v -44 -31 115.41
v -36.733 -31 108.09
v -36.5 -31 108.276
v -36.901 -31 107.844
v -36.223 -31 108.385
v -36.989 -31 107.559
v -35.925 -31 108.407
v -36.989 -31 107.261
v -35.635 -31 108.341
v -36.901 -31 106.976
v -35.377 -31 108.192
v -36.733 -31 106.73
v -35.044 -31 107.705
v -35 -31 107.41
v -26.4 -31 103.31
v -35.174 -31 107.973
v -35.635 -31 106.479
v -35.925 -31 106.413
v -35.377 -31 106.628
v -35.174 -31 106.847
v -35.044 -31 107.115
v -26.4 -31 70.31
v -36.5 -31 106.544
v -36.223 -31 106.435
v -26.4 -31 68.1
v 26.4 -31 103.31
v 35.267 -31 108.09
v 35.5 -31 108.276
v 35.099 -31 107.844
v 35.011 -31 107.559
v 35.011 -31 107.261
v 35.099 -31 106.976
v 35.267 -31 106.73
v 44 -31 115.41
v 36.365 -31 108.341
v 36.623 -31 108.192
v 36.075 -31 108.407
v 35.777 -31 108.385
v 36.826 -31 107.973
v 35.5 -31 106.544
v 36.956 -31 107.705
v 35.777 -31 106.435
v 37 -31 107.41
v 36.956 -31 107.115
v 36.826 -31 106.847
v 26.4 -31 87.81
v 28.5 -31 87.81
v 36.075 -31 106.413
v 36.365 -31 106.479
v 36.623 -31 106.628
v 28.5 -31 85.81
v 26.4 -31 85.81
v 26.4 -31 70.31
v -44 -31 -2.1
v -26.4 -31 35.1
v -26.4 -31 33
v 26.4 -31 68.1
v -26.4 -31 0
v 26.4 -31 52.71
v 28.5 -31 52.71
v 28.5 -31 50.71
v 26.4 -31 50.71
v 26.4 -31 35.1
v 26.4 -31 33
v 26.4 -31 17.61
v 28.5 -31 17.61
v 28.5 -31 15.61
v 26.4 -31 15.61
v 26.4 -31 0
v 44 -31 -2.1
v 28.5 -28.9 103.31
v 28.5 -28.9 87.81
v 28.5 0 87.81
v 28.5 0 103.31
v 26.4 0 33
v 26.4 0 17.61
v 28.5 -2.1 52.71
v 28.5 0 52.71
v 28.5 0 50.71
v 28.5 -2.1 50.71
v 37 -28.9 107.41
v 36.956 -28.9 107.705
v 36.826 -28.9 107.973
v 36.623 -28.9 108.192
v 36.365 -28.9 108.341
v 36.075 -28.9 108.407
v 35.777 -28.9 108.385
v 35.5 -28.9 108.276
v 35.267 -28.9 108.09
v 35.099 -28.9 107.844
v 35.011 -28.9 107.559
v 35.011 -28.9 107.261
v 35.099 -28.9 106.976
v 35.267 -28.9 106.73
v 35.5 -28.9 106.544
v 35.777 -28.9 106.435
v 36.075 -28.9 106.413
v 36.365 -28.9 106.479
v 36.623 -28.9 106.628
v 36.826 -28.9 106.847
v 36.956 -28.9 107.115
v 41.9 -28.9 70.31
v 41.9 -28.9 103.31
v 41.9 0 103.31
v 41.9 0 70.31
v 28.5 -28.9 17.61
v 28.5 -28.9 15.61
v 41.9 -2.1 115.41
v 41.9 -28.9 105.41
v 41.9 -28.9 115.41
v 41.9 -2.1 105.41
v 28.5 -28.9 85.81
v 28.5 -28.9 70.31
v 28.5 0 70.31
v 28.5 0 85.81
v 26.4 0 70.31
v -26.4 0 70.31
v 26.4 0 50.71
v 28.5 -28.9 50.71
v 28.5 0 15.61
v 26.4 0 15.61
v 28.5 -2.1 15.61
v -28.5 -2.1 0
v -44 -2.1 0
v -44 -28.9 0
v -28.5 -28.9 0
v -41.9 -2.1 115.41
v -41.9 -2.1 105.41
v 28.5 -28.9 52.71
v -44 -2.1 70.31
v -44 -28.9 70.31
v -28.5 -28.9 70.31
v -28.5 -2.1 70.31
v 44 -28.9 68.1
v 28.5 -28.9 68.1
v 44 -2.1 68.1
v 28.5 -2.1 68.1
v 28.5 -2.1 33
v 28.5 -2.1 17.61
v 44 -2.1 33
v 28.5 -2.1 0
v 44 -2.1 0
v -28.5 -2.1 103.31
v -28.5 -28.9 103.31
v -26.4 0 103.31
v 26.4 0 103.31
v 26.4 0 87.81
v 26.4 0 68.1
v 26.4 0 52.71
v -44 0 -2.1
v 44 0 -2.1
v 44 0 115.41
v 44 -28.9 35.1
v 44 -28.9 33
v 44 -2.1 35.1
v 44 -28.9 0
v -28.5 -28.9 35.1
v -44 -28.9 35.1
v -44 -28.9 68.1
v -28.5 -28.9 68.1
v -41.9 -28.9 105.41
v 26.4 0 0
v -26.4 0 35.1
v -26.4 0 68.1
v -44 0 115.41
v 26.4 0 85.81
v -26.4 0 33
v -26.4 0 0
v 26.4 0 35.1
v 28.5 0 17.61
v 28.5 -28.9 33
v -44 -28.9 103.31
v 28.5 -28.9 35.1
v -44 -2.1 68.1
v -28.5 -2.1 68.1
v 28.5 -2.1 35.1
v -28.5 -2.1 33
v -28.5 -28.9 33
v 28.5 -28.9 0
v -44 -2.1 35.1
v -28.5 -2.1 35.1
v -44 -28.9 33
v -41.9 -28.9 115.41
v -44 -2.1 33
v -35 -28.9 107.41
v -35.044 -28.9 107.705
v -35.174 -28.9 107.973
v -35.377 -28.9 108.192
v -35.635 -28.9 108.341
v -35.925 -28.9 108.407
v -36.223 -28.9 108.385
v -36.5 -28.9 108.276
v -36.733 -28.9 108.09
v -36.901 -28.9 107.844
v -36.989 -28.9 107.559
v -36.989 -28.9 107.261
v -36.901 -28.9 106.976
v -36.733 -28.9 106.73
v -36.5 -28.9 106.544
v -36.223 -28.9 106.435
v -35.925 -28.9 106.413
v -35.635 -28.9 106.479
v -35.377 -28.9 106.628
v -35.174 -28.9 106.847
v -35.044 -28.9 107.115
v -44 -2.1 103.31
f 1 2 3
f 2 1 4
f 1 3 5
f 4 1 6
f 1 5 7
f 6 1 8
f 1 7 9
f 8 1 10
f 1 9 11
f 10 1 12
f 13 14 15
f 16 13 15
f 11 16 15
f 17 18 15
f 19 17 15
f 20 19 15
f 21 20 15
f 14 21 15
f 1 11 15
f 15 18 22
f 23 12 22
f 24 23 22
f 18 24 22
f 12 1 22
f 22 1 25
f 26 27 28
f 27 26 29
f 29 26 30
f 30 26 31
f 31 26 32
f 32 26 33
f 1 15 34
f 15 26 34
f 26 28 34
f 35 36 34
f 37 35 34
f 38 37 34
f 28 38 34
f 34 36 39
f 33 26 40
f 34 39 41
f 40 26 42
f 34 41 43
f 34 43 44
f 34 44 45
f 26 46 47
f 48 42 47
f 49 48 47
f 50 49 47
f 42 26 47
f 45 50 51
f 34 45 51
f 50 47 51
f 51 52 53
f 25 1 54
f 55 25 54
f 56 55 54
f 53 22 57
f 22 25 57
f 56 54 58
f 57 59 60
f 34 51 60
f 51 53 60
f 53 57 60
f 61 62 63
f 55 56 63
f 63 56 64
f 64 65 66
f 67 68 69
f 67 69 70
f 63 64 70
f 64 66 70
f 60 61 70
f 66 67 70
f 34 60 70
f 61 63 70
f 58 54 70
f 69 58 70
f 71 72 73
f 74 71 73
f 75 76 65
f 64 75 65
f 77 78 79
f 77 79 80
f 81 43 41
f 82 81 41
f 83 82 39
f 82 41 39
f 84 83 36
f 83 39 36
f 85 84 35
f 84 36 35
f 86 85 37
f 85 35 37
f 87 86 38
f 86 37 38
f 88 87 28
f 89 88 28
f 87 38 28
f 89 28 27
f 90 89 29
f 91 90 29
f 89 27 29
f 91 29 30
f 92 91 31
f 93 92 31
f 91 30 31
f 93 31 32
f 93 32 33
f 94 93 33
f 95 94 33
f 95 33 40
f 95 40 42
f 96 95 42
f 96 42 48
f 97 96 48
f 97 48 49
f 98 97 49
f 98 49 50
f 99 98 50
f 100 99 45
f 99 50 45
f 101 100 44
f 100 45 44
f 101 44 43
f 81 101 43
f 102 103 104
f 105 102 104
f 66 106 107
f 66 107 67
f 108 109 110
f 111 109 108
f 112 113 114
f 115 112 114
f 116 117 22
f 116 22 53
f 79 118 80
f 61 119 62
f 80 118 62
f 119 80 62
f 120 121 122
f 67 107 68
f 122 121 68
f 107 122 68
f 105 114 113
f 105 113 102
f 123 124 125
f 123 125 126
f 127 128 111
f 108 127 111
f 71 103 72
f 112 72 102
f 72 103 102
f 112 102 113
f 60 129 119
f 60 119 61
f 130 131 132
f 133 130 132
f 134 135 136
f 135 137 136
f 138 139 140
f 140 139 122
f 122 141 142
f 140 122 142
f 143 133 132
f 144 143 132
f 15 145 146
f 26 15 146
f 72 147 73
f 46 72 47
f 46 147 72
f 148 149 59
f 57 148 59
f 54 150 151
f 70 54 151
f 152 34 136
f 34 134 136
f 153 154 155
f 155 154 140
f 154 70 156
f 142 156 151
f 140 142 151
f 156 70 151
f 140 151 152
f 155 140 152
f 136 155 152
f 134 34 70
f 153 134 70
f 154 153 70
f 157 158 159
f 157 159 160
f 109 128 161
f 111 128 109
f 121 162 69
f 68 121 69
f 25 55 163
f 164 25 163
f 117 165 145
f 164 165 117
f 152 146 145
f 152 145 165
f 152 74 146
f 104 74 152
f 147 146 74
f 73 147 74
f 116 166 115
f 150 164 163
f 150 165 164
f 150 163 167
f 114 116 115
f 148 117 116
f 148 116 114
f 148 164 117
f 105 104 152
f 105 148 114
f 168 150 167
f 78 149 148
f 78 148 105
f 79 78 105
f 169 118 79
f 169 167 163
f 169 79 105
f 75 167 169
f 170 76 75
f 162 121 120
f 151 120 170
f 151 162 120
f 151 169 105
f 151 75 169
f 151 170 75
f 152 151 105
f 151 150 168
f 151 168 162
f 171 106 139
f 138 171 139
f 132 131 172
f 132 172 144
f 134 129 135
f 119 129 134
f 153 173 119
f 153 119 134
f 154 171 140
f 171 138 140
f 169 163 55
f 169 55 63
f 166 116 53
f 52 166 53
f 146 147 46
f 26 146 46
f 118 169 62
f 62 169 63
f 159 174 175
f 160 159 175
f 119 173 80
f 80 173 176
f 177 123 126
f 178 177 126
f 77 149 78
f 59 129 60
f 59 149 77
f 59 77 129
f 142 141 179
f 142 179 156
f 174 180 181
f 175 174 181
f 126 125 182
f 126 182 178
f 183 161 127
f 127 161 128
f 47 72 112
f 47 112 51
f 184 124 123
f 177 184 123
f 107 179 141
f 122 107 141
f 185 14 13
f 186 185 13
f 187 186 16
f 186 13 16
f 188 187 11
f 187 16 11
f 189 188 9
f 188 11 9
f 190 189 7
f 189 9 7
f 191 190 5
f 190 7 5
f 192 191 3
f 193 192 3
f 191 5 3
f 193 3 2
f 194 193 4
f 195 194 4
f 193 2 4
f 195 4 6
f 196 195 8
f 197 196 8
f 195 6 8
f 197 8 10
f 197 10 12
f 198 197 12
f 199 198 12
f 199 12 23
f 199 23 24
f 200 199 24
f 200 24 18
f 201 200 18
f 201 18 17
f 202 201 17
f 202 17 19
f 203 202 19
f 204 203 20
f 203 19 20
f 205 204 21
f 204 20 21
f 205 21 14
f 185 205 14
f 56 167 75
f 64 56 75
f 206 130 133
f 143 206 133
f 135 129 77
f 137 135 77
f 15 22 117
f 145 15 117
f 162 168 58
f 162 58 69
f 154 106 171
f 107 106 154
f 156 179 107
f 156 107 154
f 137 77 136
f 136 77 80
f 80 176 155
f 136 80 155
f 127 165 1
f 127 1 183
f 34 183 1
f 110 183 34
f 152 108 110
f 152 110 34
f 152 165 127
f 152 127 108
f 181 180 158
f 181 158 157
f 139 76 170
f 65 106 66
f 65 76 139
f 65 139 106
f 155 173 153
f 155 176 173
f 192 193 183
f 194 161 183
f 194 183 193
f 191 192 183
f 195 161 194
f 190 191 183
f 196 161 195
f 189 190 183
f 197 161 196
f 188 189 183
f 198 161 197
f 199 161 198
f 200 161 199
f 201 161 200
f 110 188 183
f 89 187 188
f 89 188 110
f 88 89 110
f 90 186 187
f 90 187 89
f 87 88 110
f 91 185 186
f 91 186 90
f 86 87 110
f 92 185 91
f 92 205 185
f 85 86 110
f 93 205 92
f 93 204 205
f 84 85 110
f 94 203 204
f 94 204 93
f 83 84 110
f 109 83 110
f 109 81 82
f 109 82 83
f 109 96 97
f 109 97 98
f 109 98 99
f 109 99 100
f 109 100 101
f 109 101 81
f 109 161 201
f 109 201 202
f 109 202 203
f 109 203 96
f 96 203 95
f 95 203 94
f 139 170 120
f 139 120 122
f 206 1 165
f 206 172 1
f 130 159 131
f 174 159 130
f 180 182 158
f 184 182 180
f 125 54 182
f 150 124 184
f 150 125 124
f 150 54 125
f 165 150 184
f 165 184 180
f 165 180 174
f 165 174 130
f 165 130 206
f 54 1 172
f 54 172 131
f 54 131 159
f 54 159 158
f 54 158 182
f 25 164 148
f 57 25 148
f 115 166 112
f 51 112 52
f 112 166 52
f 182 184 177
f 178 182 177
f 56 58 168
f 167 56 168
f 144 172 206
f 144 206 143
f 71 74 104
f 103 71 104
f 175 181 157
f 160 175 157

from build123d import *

# Parameters (mm, degrees)
F0_W      = 88
F0_H      = 15.5
F1_DEPTH  = 2.1
F2_W      = 15.5
F2_H      = 2.1
F3_DEPTH  = 33
F4_W      = 88
F4_H      = 31
F5_DEPTH  = 2.1
F6_W      = 15.5
F6_H      = 2.1
F7_DEPTH  = 33
F8_W      = 88
F8_H      = 31
F9_DEPTH  = 2.21
F10_W     = 15.5
F10_H     = 2.1
F10_W_2   = 2.1
F10_H_2   = 28.9
F11_DEPTH = 33
F12_W     = 88
F12_H     = 31
F13_DEPTH = 2.1
F14_W     = 88
F14_H     = 31
F14_W_2   = 83.8
F14_H_2   = 26.8
F15_DEPTH = 10
F16_R     = 1
F17_DEPTH = 2.1
F18_W     = 31
F18_H     = 2
F19_DEPTH = 2.1


with BuildPart() as f1:
    # F0 (on Top) → F1 (new body)
    with BuildSketch(Plane.XY):
        with Locations((0, -7.75)):
            Rectangle(F0_W, F0_H)
        with Locations((0, -23.25)):
            Rectangle(F0_W, F0_H)
    extrude(amount=-F1_DEPTH)

    # F2 (on face) → F3 (join)
    with BuildSketch(Plane.XY):
        Polygon((-26.4, 0), (-28.5, 0), (-28.5, -2.1), (-28.5, -28.9), (-28.5, -31), (-26.4, -31), align=None)
        with Locations((-36.25, -1.05)):
            Rectangle(F2_W, F2_H)
        with Locations((-36.25, -29.95)):
            Rectangle(F2_W, F2_H)
        Polygon((28.5, 0), (26.4, 0), (26.4, -31), (28.5, -31), (28.5, -28.9), (28.5, -2.1), align=None)
        with Locations((36.25, -1.05)):
            Rectangle(F2_W, F2_H)
        with Locations((36.25, -29.95)):
            Rectangle(F2_W, F2_H)
    extrude(amount=F3_DEPTH)

    # F4 (on face) → F5 (join)
    with BuildSketch(Plane.XY.offset(33)):
        with Locations((0, -15.5)):
            Rectangle(F4_W, F4_H)
    extrude(amount=F5_DEPTH)

    # F6 (on face) → F7 (join)
    with BuildSketch(Plane.XY.offset(35.1)):
        Polygon((-26.4, 0), (-28.5, 0), (-28.5, -2.1), (-28.5, -28.9), (-28.5, -31), (-26.4, -31), align=None)
        with Locations((-36.25, -1.05)):
            Rectangle(F6_W, F6_H)
        with Locations((-36.25, -29.95)):
            Rectangle(F6_W, F6_H)
        Polygon((28.5, 0), (26.4, 0), (26.4, -31), (28.5, -31), (28.5, -28.9), (28.5, -2.1), align=None)
        with Locations((36.25, -29.95)):
            Rectangle(F6_W, F6_H)
        with Locations((36.25, -1.05)):
            Rectangle(F6_W, F6_H)
    extrude(amount=F7_DEPTH)

    # F8 (on face) → F9 (join)
    with BuildSketch(Plane.XY.offset(68.1)):
        with Locations((0, -15.5)):
            Rectangle(F8_W, F8_H)
    extrude(amount=F9_DEPTH)

    # F10 (on face) → F11 (join)
    with BuildSketch(Plane.XY.offset(70.31)):
        with Locations((-36.25, -1.05)):
            Rectangle(F10_W, F10_H)
        Polygon((28.5, -28.9), (28.5, -31), (44, -31), (44, -28.9), (41.9, -28.9), align=None)
        with Locations((-36.25, -29.95)):
            Rectangle(F10_W, F10_H)
        Polygon((-26.4, 0), (-28.5, 0), (-28.5, -2.1), (-28.5, -28.9), (-28.5, -31), (-26.4, -31), align=None)
        Polygon((28.5, 0), (26.4, 0), (26.4, -31), (28.5, -31), (28.5, -28.9), align=None)
        with Locations((42.95, -14.45)):
            Rectangle(F10_W_2, F10_H_2)
    extrude(amount=F11_DEPTH)

    # F12 (on face) → F13 (join)
    with BuildSketch(Plane.XY.offset(103.31)):
        with Locations((0, -15.5)):
            Rectangle(F12_W, F12_H)
    extrude(amount=F13_DEPTH)

    # F14 (on face) → F15 (join)
    with BuildSketch(Plane.XY.offset(105.41)):
        with Locations((0, -15.5)):
            Rectangle(F14_W, F14_H)
        with Locations((0, -15.5)):
            Rectangle(F14_W_2, F14_H_2, mode=Mode.SUBTRACT)
    extrude(amount=F15_DEPTH)

    # F16 (on face) → F17 (cut)
    with BuildSketch(Plane.XZ.offset(31)):
        with Locations((-36, 107.41)):
            Circle(F16_R)
        with Locations((36, 107.41)):
            Circle(F16_R)
    extrude(amount=-F17_DEPTH, mode=Mode.SUBTRACT)

    # F18 (on face) → F19 (cut)
    with BuildSketch(Plane(origin=(26.4, 0, 0), x_dir=(0, -1, 0), z_dir=(-1, 0, 0))):
        with Locations((15.5, 86.81)):
            Rectangle(F18_W, F18_H)
        with Locations((15.5, 51.71)):
            Rectangle(F18_W, F18_H)
        with Locations((15.5, 16.61)):
            Rectangle(F18_W, F18_H)
    extrude(amount=-F19_DEPTH, mode=Mode.SUBTRACT)


solid = f1.part
